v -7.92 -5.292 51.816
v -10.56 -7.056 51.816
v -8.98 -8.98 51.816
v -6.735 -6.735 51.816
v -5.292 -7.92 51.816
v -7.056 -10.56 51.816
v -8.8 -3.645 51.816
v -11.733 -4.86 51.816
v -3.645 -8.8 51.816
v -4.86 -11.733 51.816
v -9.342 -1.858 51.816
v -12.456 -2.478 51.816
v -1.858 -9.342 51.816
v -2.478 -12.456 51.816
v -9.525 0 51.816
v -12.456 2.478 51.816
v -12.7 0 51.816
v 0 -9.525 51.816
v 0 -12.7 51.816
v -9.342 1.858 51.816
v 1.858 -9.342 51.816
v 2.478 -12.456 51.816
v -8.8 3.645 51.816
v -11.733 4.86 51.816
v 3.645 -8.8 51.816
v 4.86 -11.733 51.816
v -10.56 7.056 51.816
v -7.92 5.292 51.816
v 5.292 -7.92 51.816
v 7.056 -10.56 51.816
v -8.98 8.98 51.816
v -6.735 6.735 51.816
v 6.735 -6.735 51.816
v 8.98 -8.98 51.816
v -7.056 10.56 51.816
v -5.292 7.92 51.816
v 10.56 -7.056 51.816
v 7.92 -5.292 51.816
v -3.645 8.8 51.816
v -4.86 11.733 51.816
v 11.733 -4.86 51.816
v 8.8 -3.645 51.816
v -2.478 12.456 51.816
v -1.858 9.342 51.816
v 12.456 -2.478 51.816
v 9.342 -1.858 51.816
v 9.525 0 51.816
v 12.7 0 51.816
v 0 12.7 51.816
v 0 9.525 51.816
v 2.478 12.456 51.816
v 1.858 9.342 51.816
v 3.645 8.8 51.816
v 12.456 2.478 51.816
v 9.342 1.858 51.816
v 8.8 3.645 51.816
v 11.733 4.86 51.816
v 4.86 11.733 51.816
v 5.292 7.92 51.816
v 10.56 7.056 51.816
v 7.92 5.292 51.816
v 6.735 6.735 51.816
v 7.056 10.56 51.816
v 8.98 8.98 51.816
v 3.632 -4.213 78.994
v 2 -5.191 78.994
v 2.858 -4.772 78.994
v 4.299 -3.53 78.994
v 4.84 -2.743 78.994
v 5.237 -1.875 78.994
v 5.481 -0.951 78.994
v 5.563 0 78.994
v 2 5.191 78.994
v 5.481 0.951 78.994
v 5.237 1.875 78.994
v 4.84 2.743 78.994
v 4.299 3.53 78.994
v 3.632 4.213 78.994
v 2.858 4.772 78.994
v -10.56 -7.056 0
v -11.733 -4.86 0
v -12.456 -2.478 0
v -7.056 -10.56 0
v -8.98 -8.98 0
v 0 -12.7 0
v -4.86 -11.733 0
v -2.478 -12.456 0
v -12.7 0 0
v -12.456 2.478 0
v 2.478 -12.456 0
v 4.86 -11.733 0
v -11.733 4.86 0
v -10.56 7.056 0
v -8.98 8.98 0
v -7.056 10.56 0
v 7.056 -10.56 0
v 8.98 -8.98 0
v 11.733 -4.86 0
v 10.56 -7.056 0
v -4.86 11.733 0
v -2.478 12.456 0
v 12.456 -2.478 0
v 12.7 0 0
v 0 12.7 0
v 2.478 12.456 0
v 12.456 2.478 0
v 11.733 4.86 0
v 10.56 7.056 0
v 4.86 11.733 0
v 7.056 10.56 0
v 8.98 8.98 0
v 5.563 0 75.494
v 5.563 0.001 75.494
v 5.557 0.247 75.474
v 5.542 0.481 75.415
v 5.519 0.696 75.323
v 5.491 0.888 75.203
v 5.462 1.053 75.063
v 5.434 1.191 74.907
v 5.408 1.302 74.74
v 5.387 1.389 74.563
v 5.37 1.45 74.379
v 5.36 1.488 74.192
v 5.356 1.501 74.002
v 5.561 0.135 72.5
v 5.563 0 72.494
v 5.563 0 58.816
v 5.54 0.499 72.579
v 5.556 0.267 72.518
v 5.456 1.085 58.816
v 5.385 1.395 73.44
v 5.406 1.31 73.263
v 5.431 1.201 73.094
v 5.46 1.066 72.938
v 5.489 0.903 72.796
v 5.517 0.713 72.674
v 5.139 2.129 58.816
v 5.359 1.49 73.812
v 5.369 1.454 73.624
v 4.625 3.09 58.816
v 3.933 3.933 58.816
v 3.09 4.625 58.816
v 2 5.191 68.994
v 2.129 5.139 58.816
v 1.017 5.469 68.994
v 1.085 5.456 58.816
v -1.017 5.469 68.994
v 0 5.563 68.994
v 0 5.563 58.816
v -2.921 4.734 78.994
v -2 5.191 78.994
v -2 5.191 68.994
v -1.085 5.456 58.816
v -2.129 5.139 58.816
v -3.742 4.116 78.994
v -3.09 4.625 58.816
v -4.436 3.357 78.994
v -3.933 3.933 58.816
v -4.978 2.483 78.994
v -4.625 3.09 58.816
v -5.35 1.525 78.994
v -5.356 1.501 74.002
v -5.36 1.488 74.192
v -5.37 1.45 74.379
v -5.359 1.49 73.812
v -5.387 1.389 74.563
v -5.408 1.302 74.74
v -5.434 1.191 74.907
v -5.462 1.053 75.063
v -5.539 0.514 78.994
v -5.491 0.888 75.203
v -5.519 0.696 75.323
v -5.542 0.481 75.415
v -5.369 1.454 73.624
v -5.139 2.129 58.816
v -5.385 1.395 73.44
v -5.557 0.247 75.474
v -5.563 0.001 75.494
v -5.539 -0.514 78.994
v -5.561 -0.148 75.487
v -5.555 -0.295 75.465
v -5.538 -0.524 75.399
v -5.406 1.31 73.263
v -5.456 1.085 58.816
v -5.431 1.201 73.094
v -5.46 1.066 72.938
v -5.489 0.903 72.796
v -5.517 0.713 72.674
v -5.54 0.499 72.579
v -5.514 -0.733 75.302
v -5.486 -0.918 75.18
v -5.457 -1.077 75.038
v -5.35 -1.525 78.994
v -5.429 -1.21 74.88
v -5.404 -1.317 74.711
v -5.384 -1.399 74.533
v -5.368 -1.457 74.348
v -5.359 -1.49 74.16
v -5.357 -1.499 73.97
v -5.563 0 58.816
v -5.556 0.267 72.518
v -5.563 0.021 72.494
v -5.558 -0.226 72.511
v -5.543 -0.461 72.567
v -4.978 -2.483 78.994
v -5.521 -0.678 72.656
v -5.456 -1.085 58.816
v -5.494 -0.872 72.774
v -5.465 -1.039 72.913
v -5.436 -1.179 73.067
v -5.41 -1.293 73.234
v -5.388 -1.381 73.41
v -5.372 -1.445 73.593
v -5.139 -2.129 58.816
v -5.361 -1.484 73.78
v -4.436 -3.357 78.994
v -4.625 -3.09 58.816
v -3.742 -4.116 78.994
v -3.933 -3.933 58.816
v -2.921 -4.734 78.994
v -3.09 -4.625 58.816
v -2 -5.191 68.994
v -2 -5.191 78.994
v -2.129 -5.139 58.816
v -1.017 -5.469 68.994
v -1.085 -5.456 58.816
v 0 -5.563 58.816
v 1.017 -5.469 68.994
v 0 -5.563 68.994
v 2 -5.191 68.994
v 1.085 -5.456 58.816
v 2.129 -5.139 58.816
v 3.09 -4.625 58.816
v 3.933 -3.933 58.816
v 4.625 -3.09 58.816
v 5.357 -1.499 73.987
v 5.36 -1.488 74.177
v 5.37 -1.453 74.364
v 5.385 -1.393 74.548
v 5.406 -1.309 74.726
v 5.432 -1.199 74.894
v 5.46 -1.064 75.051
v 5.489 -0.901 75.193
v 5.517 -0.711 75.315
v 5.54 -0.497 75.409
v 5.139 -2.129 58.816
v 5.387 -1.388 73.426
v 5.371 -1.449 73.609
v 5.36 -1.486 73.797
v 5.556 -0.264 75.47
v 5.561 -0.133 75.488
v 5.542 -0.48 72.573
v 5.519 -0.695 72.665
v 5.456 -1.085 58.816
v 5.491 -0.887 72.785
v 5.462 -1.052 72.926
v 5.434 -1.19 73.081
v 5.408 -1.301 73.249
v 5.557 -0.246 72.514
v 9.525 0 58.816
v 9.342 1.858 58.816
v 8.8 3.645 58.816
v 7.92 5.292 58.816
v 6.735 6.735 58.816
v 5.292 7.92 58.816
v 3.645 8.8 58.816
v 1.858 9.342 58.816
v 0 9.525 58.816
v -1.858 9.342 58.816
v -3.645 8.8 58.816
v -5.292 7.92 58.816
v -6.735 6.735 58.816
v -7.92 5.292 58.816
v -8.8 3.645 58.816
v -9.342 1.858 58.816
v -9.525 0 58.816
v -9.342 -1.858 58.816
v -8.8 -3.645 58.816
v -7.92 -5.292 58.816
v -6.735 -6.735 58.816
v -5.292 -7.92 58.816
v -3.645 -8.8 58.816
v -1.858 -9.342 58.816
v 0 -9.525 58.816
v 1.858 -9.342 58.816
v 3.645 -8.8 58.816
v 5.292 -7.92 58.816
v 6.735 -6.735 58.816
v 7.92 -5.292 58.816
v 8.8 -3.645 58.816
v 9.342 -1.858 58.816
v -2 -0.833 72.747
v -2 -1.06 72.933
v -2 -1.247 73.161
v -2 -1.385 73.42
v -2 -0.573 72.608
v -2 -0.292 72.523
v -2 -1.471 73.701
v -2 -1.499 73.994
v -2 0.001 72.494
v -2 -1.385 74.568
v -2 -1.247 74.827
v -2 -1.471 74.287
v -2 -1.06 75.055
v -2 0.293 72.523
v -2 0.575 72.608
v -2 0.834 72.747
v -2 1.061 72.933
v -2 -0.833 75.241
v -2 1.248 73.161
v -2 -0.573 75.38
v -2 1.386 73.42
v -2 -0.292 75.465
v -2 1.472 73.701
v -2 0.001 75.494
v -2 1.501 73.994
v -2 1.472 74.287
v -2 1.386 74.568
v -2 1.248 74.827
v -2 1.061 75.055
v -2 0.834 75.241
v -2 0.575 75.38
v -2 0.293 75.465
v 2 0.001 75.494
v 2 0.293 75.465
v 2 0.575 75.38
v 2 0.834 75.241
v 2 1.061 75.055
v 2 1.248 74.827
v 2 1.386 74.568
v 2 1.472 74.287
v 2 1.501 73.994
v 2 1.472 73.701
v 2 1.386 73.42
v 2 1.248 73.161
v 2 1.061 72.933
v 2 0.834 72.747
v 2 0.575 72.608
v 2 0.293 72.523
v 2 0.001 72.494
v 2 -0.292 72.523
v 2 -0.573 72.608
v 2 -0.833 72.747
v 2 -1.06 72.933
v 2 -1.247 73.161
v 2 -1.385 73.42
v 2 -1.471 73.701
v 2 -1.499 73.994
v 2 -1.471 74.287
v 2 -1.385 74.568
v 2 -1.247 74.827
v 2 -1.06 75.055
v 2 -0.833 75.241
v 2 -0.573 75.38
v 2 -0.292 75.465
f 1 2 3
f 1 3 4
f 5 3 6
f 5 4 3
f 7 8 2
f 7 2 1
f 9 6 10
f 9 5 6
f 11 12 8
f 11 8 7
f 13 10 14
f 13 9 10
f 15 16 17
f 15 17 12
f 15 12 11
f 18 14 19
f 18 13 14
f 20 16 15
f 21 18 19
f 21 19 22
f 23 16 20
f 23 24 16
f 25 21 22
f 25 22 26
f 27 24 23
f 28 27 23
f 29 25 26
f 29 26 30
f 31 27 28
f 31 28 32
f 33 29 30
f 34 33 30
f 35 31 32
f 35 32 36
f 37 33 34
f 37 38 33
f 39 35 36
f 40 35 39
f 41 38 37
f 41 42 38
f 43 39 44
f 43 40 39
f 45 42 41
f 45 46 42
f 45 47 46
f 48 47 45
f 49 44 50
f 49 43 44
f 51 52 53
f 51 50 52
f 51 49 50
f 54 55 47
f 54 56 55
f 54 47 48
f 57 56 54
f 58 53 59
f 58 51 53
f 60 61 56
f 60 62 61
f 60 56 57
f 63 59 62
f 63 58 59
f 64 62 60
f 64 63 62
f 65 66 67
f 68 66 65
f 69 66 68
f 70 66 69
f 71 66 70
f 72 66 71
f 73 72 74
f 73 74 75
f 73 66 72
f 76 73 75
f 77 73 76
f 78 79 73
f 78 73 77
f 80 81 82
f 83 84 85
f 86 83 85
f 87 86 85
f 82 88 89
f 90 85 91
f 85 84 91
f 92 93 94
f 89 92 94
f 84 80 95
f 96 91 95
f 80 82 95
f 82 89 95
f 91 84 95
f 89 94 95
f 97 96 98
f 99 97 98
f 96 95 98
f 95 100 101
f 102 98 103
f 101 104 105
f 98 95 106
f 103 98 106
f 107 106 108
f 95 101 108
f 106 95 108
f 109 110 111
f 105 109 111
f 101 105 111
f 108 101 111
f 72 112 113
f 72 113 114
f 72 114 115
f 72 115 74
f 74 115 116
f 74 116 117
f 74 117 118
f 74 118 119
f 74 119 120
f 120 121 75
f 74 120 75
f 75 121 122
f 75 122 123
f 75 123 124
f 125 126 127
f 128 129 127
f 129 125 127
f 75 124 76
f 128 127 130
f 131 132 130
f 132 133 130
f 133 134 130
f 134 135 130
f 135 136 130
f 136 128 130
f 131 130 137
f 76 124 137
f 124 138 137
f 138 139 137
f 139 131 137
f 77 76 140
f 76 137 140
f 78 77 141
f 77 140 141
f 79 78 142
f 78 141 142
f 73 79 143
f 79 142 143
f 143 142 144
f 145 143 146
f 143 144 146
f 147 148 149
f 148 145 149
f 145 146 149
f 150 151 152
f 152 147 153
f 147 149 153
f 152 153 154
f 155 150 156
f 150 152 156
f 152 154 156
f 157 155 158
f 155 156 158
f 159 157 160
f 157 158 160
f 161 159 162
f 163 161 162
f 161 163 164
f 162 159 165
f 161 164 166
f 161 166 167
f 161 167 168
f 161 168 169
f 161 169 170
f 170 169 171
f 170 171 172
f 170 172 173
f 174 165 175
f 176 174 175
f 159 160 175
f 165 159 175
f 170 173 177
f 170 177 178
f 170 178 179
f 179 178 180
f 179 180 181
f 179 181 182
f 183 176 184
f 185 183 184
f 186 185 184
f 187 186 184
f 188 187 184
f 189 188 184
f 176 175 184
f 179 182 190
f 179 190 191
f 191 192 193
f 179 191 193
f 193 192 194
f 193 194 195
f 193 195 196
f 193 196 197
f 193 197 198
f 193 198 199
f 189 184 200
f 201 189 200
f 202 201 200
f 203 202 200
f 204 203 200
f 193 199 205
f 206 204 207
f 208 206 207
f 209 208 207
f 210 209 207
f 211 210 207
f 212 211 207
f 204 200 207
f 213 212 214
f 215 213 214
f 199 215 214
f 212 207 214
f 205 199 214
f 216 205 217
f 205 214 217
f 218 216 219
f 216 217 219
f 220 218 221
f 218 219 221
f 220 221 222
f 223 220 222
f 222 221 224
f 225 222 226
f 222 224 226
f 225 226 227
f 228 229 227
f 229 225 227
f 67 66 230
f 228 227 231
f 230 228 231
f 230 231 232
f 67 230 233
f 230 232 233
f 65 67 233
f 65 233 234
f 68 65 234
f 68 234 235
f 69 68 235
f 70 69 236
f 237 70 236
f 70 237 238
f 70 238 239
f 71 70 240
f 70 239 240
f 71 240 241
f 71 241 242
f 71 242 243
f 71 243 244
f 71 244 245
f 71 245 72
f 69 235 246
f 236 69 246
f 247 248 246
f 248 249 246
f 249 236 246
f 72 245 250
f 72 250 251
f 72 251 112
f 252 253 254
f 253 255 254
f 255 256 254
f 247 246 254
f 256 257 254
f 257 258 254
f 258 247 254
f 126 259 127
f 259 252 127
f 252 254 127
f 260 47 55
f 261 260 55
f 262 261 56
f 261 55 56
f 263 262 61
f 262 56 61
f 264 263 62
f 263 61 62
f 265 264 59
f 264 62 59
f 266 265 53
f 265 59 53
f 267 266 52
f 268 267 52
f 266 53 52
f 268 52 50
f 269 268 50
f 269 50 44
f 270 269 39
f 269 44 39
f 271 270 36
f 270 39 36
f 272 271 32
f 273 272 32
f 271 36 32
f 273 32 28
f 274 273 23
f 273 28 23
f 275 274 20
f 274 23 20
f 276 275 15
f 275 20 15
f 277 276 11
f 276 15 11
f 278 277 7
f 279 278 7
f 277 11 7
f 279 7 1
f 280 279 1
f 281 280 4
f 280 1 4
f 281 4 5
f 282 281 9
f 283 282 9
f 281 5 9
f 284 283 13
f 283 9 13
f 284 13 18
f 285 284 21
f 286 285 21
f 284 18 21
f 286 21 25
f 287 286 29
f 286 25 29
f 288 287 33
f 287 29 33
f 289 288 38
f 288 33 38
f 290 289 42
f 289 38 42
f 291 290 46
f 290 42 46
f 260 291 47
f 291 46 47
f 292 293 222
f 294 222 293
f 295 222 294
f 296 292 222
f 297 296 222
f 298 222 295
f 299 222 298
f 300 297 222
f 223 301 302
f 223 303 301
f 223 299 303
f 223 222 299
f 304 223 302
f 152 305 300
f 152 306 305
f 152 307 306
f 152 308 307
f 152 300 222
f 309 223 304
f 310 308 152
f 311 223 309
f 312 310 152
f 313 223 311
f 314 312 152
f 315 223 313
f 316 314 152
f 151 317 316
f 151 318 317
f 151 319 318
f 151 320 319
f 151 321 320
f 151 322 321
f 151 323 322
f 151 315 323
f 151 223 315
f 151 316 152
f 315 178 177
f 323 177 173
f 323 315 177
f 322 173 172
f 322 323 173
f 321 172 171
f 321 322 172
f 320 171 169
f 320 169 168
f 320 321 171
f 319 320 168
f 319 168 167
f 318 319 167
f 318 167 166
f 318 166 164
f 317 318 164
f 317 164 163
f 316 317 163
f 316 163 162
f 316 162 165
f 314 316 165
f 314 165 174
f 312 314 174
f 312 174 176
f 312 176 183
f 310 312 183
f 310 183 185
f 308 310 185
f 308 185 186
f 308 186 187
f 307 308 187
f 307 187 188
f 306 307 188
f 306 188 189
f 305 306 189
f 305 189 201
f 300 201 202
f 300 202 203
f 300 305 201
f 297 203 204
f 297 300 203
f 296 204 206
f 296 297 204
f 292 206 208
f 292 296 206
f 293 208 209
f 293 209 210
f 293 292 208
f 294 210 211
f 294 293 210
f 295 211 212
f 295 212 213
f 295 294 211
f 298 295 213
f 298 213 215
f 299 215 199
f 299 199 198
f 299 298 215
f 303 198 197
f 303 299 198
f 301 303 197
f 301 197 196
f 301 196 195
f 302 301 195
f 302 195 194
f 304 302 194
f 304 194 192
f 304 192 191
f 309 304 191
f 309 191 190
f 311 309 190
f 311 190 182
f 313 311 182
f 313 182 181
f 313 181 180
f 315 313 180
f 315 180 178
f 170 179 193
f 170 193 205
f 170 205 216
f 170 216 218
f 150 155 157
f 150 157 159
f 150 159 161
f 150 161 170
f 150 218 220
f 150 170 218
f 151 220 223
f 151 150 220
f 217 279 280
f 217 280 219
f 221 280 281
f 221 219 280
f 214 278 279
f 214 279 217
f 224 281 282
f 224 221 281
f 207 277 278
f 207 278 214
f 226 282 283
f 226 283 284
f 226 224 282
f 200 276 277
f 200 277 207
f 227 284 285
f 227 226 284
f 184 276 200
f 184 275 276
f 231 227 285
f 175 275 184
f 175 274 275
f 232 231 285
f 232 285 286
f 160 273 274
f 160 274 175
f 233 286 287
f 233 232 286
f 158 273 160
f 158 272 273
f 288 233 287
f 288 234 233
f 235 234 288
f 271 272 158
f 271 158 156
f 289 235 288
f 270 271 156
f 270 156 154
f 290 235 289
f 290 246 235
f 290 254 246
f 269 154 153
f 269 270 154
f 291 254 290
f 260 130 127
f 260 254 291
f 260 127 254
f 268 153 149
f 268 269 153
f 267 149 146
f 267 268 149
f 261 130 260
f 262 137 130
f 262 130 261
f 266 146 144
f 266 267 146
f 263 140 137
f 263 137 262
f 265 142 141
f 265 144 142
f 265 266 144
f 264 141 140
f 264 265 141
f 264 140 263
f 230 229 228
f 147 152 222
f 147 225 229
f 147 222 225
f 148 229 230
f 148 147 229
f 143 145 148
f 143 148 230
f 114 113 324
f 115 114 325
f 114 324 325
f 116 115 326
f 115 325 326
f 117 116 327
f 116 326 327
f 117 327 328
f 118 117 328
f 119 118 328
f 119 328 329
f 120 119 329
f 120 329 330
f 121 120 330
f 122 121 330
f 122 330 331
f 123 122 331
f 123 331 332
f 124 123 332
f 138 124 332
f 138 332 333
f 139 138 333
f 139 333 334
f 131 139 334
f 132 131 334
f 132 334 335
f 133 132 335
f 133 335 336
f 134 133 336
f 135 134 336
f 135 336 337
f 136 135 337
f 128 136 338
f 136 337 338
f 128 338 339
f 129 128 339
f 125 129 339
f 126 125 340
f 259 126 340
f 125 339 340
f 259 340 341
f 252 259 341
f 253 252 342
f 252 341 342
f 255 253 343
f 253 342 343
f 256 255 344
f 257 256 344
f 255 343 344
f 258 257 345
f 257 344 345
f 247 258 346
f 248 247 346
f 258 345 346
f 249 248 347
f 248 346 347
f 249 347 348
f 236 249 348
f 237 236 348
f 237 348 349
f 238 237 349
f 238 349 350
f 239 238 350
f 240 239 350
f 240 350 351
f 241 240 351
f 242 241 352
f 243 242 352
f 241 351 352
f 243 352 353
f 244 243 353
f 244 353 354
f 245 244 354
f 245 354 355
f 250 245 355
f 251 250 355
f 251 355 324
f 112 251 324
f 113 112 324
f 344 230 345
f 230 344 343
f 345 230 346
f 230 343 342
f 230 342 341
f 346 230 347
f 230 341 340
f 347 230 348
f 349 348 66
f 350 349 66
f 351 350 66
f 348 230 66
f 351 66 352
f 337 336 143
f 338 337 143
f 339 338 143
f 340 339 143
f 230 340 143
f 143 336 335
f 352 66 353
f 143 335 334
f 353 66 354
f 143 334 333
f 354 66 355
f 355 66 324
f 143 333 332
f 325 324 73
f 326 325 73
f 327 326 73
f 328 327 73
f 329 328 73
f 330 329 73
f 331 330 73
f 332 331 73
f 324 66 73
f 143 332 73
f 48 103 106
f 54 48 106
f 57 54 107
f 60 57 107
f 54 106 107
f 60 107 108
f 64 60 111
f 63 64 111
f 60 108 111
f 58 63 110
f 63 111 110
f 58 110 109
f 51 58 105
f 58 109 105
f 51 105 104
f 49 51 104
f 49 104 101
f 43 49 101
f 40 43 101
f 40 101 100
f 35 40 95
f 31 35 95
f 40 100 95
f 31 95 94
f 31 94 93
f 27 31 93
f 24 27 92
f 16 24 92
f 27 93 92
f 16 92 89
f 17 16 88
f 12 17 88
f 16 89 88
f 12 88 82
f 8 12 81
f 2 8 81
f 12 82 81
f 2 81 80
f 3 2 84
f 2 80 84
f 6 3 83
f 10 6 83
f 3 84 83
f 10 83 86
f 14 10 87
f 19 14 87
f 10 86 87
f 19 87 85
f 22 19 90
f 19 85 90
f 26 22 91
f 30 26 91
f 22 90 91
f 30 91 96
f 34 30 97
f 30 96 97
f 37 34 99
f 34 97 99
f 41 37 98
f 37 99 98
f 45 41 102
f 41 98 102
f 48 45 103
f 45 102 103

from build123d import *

# Parameters (mm, degrees)
SKETCH1_R               = 12.7
EXTRUDE1_DEPTH          = 51.816
SKETCH2_R               = 9.525
EXTRUDE2_DEPTH          = 7
SKETCH3_R               = 5.5626
EXTRUDE3_DEPTH          = 20.178
SKETCH4_W               = 4
SKETCH4_H               = 12
CUT_EXTRUDE1_DEPTH      = 10
SKETCH5_R               = 1.5
CUT_EXTRUDE2_DEPTH      = 10
CUT_EXTRUDE2_DEPTH_BACK = 10


with BuildPart() as part:
    # Sketch1 → Extrude1 (new body)
    with BuildSketch(Plane.XY):
        Circle(SKETCH1_R)
    extrude(amount=EXTRUDE1_DEPTH)

    # Sketch2 → Extrude2 (add)
    with BuildSketch(Plane.XY.offset(51.816)):
        Circle(SKETCH2_R)
    extrude(amount=EXTRUDE2_DEPTH)

    # Sketch3 → Extrude3 (add)
    with BuildSketch(Plane.XY.offset(58.816)):
        Circle(SKETCH3_R)
    extrude(amount=EXTRUDE3_DEPTH)

    # Sketch4 → Cut-Extrude1 (cut)
    with BuildSketch(Plane.XY.offset(78.994)):
        Rectangle(SKETCH4_W, SKETCH4_H)
    extrude(amount=-CUT_EXTRUDE1_DEPTH, mode=Mode.SUBTRACT)

    # Sketch5 → Cut-Extrude2 (cut, two sides)
    with BuildSketch(Plane.ZY.offset(-2)) as cut_extrude2_sk:
        with Locations((73.994, 0.000618341)):
            Circle(SKETCH5_R)
    extrude(amount=CUT_EXTRUDE2_DEPTH, mode=Mode.SUBTRACT)
    extrude(cut_extrude2_sk.sketch, amount=-CUT_EXTRUDE2_DEPTH_BACK, mode=Mode.SUBTRACT)


solid = part.part
